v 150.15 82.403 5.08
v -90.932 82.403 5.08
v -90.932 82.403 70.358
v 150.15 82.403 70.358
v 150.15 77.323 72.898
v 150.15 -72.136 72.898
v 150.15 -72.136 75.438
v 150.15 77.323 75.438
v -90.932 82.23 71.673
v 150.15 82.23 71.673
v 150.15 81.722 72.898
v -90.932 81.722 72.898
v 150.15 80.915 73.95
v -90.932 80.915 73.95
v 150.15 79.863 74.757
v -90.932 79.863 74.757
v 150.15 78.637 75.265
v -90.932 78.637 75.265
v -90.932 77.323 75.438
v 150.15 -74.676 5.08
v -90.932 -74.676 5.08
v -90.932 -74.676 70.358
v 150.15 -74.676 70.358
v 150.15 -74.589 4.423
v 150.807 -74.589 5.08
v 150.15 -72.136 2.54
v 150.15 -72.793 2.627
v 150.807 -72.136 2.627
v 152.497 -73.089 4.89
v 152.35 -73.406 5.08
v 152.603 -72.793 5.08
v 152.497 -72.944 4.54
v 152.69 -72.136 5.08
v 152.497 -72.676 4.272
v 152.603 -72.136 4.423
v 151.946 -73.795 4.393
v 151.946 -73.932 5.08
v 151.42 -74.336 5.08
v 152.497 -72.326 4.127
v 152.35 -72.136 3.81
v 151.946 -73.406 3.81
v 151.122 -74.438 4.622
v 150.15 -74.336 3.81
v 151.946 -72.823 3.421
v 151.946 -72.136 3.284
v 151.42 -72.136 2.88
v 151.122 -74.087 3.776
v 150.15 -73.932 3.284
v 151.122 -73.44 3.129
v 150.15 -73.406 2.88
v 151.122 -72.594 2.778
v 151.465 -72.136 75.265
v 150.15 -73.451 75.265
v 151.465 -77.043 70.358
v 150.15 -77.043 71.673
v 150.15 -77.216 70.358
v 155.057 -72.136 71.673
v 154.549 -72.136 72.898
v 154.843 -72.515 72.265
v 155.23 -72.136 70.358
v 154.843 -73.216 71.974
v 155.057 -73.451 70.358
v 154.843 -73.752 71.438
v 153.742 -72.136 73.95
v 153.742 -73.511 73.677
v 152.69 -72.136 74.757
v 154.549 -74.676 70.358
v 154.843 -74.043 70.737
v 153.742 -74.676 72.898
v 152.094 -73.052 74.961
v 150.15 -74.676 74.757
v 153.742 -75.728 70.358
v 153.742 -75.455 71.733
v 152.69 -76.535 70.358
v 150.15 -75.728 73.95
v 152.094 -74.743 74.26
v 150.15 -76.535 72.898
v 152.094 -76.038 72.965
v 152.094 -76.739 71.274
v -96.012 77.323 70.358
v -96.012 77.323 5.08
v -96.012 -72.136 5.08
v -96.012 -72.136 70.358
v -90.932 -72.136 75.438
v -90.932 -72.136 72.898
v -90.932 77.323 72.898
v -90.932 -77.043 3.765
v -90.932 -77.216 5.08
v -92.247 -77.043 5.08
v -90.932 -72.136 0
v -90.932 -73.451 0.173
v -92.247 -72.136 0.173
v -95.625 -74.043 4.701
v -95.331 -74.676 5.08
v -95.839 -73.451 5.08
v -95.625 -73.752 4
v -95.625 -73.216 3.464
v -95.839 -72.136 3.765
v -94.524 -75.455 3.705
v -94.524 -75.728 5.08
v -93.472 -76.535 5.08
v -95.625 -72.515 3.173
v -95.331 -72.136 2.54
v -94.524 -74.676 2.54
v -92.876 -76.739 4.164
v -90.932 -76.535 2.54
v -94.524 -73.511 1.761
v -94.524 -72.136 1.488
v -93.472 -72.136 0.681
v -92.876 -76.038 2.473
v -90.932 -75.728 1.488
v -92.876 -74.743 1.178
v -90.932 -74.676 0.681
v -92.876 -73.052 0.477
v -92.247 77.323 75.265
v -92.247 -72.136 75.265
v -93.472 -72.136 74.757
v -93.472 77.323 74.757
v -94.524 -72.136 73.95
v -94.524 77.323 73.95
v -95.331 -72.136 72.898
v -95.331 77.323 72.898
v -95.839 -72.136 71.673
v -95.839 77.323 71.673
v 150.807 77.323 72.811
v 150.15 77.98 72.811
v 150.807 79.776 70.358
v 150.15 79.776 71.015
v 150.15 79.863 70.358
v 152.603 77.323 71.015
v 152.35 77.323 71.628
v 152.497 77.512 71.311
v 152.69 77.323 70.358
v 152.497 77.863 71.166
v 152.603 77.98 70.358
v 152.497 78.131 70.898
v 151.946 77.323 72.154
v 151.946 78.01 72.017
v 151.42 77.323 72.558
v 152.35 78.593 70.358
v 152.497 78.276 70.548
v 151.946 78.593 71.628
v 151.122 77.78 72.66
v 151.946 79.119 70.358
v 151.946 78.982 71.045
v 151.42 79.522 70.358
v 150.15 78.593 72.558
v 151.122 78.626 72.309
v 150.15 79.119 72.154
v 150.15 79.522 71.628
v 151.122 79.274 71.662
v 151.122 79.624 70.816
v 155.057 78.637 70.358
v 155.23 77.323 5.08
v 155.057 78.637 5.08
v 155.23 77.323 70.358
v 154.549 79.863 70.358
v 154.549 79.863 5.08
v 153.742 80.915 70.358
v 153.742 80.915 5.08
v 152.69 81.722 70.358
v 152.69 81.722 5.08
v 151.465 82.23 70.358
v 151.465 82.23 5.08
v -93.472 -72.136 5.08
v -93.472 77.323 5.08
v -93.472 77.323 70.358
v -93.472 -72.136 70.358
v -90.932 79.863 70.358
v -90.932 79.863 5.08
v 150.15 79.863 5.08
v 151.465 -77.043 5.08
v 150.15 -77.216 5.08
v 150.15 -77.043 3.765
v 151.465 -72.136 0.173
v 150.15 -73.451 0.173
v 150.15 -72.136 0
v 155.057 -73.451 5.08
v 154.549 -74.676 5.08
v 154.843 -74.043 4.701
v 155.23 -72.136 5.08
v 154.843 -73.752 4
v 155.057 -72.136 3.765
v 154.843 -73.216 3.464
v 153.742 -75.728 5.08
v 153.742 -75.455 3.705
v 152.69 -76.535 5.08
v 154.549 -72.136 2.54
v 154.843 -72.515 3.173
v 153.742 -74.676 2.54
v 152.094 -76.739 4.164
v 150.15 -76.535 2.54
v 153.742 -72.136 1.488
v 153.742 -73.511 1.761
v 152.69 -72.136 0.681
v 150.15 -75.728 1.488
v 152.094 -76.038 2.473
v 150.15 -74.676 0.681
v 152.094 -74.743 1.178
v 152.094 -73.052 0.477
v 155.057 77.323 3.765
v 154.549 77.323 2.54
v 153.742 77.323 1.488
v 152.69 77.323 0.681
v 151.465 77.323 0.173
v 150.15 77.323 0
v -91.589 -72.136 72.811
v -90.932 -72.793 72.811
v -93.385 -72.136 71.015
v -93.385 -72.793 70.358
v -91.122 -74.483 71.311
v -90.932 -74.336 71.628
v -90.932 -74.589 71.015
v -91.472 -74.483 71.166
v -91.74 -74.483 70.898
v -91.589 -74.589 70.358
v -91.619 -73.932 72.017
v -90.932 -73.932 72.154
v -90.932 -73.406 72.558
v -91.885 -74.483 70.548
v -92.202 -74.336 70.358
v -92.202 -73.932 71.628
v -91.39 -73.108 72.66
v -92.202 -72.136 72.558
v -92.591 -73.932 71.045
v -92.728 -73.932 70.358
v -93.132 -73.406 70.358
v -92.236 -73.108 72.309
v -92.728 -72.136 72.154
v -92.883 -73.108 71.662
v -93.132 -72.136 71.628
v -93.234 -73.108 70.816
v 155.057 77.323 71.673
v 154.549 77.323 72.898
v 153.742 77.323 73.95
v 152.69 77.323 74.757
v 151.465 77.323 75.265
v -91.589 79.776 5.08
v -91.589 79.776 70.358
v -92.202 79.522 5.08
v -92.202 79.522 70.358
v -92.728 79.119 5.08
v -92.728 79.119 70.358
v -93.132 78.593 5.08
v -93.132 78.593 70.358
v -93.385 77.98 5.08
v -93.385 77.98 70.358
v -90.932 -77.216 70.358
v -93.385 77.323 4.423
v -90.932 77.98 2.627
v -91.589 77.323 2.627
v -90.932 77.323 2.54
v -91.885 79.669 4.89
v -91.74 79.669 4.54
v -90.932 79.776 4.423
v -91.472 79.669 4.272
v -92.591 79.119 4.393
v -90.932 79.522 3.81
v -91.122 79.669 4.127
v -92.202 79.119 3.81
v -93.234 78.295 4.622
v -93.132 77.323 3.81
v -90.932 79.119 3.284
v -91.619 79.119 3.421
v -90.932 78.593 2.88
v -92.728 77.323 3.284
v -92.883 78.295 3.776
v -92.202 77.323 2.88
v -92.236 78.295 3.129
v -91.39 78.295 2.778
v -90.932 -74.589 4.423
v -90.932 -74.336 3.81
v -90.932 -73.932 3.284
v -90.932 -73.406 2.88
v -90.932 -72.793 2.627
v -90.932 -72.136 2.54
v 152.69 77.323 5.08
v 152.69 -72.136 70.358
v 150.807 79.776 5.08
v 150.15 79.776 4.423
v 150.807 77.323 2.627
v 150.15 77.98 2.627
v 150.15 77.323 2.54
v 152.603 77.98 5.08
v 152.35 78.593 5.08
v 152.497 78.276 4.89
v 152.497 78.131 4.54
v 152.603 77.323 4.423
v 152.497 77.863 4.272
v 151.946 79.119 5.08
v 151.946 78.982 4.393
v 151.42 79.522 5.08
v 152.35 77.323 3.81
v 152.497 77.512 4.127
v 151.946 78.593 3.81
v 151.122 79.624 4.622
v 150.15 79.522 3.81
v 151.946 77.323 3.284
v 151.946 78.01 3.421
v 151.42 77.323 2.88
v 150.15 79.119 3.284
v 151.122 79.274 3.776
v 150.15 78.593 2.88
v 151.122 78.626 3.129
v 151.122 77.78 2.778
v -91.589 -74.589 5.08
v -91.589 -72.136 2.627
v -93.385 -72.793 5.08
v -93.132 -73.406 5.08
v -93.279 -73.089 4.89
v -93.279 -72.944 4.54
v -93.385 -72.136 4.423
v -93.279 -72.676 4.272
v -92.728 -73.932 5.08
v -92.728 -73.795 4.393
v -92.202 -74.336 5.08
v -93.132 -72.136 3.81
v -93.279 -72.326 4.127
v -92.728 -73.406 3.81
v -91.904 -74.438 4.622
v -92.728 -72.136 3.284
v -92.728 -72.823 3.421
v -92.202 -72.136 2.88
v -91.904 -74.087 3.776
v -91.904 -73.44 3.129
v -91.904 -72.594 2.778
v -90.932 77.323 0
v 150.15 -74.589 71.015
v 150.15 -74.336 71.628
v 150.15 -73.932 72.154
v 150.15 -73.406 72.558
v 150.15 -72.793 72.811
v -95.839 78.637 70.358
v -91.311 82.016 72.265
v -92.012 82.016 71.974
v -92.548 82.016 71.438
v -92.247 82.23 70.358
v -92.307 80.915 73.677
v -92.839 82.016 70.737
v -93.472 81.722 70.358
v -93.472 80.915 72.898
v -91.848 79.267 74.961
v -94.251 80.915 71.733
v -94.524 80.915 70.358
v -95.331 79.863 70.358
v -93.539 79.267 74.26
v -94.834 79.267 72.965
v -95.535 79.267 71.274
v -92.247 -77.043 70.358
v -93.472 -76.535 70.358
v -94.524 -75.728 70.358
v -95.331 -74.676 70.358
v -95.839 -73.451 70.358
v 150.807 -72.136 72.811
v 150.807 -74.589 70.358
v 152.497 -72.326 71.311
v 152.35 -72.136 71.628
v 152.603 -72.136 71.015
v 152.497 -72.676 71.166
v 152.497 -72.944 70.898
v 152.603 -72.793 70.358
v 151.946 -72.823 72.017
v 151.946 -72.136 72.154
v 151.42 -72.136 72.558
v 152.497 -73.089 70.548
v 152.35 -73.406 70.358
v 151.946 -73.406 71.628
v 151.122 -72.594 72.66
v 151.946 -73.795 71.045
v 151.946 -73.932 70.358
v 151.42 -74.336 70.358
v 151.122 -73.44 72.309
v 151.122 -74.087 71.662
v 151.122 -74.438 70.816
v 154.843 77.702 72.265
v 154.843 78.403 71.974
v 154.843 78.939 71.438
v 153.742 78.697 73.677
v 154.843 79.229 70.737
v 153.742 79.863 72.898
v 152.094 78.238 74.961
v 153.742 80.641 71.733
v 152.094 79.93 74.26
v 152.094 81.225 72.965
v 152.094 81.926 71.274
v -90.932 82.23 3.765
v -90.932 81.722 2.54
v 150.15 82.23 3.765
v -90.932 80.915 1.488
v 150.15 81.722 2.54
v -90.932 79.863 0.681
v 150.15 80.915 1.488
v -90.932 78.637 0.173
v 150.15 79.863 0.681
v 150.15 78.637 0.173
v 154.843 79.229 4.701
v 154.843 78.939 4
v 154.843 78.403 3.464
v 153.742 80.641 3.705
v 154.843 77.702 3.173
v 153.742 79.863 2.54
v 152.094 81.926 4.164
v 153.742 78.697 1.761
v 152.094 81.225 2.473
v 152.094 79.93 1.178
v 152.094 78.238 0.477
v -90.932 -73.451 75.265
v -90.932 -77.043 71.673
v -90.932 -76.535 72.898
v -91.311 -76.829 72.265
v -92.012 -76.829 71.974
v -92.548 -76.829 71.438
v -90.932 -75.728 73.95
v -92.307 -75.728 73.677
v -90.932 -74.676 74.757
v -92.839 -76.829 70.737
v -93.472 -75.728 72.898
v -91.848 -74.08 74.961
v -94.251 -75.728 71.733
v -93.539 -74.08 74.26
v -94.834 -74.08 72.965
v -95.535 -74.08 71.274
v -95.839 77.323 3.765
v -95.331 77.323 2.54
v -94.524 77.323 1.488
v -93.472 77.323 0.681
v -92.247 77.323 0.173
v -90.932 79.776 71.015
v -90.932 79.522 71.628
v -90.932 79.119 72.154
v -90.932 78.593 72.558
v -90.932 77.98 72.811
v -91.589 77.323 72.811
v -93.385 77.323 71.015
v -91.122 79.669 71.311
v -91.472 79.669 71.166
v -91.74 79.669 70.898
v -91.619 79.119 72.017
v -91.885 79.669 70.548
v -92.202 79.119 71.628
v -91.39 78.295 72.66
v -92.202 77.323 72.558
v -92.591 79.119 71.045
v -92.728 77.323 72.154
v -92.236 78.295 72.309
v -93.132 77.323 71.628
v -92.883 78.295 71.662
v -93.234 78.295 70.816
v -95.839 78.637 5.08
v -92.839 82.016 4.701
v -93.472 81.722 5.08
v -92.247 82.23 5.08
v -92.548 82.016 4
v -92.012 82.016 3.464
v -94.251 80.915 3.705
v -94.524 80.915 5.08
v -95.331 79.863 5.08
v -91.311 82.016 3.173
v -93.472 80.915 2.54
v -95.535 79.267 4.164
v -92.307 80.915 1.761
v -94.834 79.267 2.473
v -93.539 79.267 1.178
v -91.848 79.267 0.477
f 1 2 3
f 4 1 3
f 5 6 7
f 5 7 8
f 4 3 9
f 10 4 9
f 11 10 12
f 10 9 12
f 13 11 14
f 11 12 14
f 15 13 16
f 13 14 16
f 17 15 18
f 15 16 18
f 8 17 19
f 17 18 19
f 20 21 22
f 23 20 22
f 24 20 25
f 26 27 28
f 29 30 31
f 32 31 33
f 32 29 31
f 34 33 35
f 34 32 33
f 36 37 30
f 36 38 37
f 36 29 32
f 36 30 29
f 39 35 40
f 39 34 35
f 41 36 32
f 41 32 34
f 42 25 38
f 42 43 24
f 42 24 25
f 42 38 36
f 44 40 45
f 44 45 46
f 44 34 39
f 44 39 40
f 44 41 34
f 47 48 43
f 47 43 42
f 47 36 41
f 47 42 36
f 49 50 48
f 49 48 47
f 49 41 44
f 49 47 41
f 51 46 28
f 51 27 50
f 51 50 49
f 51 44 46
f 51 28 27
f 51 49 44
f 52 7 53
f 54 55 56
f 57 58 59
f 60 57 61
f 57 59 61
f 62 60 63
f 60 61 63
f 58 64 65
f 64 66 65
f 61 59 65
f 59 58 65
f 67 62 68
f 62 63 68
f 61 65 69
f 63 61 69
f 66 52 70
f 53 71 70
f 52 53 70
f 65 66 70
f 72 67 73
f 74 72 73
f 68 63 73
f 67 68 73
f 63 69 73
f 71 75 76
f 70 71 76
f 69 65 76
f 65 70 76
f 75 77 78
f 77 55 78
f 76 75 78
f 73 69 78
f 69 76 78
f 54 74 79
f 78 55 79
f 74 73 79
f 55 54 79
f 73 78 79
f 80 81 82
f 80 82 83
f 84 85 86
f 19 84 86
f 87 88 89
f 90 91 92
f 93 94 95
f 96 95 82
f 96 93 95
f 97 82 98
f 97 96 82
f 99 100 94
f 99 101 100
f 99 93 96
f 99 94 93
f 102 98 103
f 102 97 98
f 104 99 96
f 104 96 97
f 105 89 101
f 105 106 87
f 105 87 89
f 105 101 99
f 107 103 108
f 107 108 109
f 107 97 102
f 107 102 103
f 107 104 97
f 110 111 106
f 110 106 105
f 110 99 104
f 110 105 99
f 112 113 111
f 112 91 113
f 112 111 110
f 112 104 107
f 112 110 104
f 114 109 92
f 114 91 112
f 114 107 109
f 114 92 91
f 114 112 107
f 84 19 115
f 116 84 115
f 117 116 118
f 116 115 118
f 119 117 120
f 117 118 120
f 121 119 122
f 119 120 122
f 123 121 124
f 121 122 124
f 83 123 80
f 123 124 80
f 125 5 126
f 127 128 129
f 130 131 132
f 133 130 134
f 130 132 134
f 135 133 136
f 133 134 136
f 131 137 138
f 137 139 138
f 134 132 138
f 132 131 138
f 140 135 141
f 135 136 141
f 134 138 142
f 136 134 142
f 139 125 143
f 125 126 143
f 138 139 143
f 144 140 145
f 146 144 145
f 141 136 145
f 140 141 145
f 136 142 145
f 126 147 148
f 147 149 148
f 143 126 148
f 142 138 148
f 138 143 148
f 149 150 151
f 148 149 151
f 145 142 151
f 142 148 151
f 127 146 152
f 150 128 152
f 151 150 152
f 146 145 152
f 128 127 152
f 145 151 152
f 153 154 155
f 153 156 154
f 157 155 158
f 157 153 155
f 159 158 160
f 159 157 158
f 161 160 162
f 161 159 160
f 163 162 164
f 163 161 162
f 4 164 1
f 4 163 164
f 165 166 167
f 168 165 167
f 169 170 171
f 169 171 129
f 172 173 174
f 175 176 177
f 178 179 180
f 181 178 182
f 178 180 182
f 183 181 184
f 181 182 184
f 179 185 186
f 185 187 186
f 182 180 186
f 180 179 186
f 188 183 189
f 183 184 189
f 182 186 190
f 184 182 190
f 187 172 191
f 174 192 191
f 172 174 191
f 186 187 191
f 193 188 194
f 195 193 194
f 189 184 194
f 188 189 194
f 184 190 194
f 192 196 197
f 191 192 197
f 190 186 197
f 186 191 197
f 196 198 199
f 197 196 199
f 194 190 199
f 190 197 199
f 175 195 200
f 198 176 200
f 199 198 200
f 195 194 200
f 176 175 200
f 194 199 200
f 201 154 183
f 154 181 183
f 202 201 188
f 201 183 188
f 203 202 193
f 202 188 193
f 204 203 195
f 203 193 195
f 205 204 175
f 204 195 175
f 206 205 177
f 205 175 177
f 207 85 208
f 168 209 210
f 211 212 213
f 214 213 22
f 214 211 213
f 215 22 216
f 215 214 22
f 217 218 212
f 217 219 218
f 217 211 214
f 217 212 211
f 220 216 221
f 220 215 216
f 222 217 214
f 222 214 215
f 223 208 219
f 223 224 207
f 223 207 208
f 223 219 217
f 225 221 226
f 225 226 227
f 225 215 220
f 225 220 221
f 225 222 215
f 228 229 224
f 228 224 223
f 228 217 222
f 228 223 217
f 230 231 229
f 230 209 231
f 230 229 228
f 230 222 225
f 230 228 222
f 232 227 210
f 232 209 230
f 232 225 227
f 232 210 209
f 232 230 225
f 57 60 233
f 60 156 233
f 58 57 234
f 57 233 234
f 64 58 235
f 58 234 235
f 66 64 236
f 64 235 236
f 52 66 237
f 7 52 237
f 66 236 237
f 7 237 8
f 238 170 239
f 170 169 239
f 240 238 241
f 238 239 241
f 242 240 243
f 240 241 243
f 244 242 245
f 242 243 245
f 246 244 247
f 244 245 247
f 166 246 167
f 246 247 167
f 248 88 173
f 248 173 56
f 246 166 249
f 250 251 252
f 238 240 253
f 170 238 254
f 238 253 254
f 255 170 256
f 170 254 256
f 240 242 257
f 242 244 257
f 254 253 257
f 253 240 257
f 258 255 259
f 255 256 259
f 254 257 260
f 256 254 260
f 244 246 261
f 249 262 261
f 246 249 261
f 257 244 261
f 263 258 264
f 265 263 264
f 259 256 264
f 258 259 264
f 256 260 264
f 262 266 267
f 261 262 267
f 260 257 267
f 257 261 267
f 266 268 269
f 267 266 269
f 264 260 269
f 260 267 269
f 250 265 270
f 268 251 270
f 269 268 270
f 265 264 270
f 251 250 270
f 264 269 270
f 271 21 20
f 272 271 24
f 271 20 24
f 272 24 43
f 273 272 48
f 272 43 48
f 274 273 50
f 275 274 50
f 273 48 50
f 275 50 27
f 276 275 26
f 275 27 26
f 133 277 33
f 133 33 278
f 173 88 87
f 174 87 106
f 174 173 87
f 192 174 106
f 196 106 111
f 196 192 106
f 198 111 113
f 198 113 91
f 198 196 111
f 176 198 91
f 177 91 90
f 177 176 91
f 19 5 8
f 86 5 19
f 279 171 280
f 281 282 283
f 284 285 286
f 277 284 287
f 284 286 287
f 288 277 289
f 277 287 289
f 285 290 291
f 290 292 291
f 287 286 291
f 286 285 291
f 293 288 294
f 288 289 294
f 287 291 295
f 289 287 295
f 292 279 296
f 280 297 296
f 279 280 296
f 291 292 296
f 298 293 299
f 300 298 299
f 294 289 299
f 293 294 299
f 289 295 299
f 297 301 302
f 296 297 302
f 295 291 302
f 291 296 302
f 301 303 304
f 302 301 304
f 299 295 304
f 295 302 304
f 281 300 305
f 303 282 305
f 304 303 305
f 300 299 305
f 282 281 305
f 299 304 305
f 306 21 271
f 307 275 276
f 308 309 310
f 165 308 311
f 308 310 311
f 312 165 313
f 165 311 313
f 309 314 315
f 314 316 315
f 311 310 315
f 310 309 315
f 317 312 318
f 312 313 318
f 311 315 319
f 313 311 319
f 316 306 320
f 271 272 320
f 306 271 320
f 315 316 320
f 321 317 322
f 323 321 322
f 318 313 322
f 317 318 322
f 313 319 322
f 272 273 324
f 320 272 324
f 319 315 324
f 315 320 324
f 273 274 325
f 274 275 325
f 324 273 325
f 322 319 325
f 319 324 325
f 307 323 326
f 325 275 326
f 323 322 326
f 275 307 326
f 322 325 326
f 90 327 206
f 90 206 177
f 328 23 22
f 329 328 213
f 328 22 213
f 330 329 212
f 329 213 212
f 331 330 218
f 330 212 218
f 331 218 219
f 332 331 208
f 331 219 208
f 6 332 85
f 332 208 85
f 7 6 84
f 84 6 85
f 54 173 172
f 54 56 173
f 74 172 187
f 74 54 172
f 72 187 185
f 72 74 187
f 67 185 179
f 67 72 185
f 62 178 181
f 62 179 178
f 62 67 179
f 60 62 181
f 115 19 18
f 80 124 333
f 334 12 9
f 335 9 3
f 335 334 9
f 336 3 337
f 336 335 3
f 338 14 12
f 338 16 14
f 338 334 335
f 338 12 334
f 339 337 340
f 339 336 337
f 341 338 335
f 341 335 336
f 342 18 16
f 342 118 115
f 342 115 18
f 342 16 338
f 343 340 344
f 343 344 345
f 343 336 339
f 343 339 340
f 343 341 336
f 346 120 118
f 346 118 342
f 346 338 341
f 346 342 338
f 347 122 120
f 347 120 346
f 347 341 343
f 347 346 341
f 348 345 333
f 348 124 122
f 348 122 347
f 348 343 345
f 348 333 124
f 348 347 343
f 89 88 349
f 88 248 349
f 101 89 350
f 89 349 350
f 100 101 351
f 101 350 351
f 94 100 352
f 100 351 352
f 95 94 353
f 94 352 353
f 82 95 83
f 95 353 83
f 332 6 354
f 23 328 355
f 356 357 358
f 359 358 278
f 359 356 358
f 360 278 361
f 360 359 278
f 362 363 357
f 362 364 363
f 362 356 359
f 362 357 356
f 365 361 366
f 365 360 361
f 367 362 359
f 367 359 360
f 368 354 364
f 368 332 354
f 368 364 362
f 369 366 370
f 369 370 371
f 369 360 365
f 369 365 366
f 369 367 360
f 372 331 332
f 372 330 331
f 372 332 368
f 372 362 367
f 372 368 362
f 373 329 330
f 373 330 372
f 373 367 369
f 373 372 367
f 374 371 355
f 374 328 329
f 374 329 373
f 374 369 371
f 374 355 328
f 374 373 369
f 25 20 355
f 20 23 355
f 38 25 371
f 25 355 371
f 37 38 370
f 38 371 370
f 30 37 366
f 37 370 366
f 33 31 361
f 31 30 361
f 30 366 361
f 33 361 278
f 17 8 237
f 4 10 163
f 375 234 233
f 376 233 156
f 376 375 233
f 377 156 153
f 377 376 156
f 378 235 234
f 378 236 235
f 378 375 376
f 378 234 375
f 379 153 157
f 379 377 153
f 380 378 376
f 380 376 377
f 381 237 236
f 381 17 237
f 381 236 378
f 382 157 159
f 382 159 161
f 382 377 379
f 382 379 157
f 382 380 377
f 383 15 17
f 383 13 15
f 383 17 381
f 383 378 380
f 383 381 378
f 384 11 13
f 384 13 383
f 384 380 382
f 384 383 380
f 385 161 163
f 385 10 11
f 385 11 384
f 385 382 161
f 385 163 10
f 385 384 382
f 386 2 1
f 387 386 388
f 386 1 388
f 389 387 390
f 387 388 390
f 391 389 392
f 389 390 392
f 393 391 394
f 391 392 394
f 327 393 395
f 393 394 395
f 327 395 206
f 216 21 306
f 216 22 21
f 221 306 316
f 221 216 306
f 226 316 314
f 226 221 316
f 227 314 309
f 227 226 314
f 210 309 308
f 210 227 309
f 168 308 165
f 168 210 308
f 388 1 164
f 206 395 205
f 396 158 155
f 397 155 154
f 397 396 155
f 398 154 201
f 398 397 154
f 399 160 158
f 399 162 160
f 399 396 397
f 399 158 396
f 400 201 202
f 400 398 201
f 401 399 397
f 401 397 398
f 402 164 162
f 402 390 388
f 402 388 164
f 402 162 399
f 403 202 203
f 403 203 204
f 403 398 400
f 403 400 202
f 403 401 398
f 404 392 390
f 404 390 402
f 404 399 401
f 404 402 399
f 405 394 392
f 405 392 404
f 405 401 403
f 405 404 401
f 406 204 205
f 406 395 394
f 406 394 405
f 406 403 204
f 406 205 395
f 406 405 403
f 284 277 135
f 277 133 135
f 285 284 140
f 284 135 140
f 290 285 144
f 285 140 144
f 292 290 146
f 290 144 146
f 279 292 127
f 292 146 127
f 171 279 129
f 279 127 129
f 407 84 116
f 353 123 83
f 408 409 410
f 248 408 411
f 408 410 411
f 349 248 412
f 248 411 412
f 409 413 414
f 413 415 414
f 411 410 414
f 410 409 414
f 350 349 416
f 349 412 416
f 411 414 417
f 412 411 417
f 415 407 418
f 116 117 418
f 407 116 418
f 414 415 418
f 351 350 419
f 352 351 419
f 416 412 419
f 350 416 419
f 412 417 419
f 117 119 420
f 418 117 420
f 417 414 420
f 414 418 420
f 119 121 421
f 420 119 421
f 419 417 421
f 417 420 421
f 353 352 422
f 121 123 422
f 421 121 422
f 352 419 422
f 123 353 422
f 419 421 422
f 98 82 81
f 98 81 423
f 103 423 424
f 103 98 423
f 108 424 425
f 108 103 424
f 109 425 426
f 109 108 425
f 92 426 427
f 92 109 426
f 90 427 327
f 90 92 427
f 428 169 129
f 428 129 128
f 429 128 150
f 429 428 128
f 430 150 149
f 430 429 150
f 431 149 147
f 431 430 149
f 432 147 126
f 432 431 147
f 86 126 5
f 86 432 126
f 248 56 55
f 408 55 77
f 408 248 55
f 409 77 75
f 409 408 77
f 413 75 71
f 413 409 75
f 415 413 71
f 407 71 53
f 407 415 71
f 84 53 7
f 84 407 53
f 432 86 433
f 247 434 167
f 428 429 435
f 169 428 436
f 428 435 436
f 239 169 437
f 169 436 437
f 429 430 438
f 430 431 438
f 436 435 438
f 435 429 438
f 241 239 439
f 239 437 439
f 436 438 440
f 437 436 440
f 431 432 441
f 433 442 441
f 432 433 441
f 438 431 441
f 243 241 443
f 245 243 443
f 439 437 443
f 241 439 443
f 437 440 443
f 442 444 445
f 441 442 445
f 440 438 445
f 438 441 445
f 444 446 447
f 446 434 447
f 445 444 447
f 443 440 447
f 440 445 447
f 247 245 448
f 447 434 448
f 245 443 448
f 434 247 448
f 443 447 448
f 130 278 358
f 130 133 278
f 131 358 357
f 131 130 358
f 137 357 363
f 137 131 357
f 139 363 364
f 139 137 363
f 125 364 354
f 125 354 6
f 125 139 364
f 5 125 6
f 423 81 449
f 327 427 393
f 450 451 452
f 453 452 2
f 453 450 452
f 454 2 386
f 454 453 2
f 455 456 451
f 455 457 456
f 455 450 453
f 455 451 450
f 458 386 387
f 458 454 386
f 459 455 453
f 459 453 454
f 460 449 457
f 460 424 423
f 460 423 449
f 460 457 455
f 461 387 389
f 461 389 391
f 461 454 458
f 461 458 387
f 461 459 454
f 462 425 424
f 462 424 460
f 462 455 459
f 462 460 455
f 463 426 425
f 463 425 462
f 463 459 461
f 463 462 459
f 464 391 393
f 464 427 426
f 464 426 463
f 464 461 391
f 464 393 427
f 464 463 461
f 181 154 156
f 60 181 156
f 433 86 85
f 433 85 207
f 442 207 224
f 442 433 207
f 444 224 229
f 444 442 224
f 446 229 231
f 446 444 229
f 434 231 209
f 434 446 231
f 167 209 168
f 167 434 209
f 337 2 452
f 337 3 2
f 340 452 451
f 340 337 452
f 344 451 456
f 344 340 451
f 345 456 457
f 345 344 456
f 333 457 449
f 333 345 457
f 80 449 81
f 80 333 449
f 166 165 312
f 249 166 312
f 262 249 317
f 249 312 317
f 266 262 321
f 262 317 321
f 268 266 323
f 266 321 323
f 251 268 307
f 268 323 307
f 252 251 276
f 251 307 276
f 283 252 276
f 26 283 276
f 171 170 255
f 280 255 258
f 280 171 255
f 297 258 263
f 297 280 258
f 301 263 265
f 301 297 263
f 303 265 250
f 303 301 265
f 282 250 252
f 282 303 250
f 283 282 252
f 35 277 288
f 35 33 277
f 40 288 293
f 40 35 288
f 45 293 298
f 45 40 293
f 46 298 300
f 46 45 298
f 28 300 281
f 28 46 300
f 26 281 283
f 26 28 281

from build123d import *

# Parameters (mm, degrees)
F0_W     = 155.229896307
F0_H     = 82.4026092887
F1_DEPTH = 75.438
F2_DEPTH = 77.216
F3_DEPTH = 96.012
F4_R     = 5.08
F5_T     = -2.54
F6_R     = 16.8009840587
F7_DEPTH = 2.54


# Not quite as in the source:
# - a shell that OpenCascade refuses in one call is made with other operations: the cavity is built on its own and cut out


with BuildPart() as f1:
    # F0 (on Top) → F1 (new body)
    with BuildSketch(Plane.XY):
        with Locations((77.6149481535, 41.2013046443)):
            Rectangle(F0_W, F0_H)
    extrude(amount=F1_DEPTH)

    # F2 (add): a face of the model
    f2_faces = [f1.faces().sort_by_distance(p)[0] for p in [
        (77.6149481535, 0, 37.719),
    ]]
    extrude(f2_faces, amount=F2_DEPTH)

    # F3 (add): a face of the model
    f3_faces = [f1.faces().sort_by_distance(p)[0] for p in [
        (0, 2.5933046443, 37.719),
    ]]
    extrude(f3_faces, amount=F3_DEPTH)

    # F4
    f4_edges = [f1.edges().sort_by_distance(p)[0] for p in [
        (-96.012, 2.593305, 75.438),
        (29.608948, -77.216, 75.438),
        (29.608948, -77.216, 0),
        (-96.012, -77.216, 37.719),
        (-96.012, 2.593305, 0),
        (29.608948, 82.402609, 75.438),
        (155.229896, 2.593305, 75.438),
        (155.229896, -77.216, 37.719),
        (-96.012, 82.402609, 37.719),
        (29.608948, 82.402609, 0),
        (155.229896, 82.402609, 37.719),
        (155.229896, 2.593305, 0),
    ]]
    fillet(f4_edges, radius=F4_R)

    # F5: a shell. OpenCascade refuses it in one call, so the cavity is built on its own and cut out:
    # the body offset inwards by the wall thickness, plus a prism from it out through each open face.
    f5_core = offset(f1.part, amount=F5_T, mode=Mode.PRIVATE)
    f5_exits = [f5_core.faces().sort_by_distance(p)[0] for p in [
        (29.608948, 2.593305, 72.898),
    ]]
    add(f5_core, mode=Mode.SUBTRACT)
    extrude(f5_exits, amount=-F5_T, mode=Mode.SUBTRACT)

    # F6 (on face) → F7 (join, through all)
    with BuildSketch(Plane.YZ.offset(155.229896307)):
        with Locations((0, 37.719)):
            Circle(F6_R)
    extrude(amount=-F7_DEPTH)


solid = f1.part
